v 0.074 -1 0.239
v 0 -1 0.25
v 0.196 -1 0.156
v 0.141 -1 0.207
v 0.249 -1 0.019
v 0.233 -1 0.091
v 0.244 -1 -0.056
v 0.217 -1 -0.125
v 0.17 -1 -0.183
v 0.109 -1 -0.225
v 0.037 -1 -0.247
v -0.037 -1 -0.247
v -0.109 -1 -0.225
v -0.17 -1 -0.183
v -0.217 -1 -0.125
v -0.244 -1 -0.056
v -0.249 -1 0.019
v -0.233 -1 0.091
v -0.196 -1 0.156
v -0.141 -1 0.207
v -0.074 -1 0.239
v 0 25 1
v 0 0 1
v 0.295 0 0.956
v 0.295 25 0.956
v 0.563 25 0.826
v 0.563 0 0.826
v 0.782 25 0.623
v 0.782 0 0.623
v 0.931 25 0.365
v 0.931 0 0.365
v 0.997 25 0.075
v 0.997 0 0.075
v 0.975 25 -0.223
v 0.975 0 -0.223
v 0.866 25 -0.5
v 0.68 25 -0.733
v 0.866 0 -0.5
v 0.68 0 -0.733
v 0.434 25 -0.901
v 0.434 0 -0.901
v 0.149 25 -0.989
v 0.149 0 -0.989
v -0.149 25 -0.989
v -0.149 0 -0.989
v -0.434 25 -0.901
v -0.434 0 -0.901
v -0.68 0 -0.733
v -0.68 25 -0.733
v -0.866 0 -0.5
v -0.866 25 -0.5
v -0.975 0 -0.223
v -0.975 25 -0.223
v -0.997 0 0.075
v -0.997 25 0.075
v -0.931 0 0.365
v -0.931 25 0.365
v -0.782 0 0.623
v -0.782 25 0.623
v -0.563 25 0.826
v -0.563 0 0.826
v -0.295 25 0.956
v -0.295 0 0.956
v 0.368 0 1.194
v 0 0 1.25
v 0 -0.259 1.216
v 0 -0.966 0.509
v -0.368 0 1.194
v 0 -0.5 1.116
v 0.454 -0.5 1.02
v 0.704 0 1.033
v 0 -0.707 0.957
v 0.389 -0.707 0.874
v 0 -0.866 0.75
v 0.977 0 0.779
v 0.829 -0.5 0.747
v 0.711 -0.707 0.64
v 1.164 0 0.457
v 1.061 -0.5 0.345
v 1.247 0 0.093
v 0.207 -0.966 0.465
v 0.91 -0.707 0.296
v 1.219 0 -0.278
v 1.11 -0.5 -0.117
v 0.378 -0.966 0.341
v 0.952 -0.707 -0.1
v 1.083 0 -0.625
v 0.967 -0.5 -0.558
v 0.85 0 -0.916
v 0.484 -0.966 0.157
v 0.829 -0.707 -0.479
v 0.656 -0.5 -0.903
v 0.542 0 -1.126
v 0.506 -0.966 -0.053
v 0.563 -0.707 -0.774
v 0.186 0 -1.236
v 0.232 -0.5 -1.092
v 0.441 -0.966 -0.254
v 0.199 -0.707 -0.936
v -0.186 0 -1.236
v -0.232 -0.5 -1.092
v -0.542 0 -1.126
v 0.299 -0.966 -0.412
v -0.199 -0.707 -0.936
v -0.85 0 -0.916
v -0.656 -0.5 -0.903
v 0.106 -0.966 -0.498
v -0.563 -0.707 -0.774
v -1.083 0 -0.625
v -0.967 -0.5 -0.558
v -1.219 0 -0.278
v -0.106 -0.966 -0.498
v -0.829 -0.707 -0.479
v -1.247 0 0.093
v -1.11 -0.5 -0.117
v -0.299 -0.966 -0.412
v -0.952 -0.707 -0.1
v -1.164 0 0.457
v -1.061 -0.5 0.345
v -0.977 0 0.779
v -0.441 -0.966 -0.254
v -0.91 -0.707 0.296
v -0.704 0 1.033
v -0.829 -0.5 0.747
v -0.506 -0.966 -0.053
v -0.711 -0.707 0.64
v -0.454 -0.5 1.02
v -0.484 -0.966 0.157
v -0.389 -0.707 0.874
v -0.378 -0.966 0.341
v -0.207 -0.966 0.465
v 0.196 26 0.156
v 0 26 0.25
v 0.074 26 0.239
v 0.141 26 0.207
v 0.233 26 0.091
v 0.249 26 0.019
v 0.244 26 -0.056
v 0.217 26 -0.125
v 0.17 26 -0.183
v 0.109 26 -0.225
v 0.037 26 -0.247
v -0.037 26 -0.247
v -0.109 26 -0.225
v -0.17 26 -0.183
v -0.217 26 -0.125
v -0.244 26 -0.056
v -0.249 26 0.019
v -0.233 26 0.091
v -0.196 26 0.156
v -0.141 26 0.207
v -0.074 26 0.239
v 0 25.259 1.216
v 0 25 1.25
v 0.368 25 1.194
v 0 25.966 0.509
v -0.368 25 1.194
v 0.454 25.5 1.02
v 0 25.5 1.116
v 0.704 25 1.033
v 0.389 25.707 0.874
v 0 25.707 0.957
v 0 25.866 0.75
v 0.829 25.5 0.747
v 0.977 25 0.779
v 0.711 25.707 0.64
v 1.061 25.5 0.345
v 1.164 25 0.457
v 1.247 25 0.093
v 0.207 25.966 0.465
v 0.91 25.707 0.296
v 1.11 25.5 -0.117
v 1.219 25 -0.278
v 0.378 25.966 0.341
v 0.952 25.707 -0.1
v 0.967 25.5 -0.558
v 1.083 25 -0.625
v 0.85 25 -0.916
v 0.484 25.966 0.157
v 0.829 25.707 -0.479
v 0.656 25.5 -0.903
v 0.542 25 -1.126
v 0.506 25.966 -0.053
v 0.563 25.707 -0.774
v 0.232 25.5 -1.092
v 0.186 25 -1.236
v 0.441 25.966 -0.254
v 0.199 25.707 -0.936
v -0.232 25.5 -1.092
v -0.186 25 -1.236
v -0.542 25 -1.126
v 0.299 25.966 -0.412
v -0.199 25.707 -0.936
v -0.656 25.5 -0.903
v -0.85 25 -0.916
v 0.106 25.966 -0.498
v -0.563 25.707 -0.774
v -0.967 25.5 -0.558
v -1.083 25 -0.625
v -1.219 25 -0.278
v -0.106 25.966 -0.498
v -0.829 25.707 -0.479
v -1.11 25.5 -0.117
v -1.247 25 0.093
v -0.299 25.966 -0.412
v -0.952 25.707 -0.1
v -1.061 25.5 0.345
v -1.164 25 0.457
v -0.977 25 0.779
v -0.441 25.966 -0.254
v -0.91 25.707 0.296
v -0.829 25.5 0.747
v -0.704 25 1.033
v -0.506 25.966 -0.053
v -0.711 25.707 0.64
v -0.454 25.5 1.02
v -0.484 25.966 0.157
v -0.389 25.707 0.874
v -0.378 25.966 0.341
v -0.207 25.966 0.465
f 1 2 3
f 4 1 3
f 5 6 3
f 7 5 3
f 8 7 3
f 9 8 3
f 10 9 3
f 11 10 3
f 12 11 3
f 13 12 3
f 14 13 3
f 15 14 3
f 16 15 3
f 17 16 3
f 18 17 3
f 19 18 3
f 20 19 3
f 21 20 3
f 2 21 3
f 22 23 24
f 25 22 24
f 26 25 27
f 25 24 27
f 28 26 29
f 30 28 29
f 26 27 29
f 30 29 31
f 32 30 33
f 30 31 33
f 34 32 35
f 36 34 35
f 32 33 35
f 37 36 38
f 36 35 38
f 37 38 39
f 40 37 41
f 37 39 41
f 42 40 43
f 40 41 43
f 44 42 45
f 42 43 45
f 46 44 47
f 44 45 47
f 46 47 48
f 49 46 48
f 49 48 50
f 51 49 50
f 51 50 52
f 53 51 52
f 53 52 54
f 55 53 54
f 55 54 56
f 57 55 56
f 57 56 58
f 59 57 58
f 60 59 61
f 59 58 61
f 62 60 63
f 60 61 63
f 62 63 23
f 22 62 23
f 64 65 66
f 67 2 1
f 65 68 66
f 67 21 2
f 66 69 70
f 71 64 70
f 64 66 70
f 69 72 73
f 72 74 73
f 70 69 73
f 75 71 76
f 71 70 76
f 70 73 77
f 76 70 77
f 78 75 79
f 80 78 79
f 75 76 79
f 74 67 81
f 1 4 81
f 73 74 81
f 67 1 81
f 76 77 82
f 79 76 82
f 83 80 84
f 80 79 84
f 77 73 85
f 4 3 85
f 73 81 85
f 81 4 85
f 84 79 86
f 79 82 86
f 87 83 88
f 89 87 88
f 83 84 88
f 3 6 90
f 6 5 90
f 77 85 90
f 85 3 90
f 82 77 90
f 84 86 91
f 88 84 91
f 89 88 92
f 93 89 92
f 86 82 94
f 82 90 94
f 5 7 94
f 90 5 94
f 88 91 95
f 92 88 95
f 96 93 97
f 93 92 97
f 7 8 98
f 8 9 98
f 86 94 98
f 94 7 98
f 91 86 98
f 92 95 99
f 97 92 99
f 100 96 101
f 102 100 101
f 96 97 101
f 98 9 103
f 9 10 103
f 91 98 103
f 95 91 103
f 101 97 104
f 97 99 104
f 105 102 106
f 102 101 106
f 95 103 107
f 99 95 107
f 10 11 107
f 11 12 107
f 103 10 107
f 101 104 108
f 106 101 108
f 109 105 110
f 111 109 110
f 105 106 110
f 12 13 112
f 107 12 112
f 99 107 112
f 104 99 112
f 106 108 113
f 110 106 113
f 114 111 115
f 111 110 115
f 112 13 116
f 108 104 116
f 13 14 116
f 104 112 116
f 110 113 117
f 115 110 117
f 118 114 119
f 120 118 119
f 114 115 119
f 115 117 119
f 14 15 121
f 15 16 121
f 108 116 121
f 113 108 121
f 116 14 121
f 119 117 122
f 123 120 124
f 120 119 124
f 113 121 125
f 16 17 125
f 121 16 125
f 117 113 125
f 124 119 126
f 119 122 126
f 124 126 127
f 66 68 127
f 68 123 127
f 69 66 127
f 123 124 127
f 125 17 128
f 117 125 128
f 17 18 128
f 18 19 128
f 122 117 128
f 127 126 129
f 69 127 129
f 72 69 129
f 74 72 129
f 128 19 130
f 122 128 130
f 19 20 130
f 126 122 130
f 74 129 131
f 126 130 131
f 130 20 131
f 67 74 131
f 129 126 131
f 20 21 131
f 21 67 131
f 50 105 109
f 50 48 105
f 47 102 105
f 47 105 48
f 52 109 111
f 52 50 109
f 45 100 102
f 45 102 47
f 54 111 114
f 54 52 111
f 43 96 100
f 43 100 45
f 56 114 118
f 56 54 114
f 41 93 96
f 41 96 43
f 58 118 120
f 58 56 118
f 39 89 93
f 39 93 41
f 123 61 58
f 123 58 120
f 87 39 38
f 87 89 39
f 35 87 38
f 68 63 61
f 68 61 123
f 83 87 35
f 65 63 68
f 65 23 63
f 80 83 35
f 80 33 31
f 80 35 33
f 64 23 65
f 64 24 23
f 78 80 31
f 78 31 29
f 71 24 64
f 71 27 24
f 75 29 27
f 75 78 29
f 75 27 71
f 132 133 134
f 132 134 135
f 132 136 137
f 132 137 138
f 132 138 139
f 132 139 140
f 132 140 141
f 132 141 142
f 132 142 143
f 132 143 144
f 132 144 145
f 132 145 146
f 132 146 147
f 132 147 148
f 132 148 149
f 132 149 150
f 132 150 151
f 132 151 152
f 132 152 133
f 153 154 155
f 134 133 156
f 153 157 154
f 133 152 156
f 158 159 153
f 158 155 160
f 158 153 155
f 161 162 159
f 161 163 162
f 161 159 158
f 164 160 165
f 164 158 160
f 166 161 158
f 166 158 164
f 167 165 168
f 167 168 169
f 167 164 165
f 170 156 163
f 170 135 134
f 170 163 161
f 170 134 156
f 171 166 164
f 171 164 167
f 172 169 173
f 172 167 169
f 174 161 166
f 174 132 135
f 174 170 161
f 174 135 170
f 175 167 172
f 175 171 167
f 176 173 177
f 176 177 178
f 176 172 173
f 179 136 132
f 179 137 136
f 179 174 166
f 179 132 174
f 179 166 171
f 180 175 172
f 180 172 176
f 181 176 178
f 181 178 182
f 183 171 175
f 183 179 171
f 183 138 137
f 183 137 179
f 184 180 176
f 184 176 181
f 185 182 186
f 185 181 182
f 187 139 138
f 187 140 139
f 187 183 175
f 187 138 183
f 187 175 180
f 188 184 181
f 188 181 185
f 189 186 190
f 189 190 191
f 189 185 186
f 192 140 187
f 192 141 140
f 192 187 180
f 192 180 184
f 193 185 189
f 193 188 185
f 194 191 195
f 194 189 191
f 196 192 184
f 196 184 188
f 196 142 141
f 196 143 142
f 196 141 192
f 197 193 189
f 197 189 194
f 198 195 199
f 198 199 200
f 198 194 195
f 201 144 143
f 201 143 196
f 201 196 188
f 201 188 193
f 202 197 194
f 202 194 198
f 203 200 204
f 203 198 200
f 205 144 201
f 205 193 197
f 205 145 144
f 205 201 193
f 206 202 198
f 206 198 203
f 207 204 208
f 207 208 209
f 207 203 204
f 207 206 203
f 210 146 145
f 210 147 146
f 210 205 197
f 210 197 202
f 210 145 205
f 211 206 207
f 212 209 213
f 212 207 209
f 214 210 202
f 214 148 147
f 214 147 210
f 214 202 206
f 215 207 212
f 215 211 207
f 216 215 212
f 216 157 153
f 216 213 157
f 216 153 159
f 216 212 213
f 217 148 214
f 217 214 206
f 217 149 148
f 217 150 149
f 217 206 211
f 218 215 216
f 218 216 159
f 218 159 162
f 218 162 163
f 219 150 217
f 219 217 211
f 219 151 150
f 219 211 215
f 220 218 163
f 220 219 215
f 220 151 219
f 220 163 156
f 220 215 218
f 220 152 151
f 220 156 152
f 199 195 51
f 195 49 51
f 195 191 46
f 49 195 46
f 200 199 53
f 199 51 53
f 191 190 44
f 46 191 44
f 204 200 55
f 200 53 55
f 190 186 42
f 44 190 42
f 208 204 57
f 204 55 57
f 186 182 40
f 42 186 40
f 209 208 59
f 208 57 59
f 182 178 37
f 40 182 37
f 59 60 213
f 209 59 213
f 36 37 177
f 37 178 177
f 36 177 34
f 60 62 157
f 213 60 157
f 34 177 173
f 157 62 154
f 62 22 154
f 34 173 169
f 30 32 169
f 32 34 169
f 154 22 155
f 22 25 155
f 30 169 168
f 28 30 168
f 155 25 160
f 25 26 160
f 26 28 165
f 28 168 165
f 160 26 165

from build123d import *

# Parameters (mm, degrees)
SKETCH1_R           = 1
BOSS_EXTRUDE1_DEPTH = 25
SKETCH2_R           = 1.25
BOSS_EXTRUDE2_DEPTH = 1
FILLET1_R           = 1
BOSS_EXTRUDE5_START = 26
SKETCH3_R           = 1.25
BOSS_EXTRUDE5_DEPTH = 1
FILLET2_R           = 1


with BuildPart() as part:
    # Sketch1 → Boss-Extrude1 (new body)
    with BuildSketch(Plane(origin=(0, 0, 0), x_dir=(1, 0, 0), z_dir=(0, 1, 0))):
        with Locations(Location((0, 0, 0), (0, 0, 270))):
            Circle(SKETCH1_R)
    extrude(amount=BOSS_EXTRUDE1_DEPTH)

    # Sketch2 → Boss-Extrude2 (add)
    with BuildSketch(Plane(origin=(0, 0, 0), x_dir=(1, 0, 0), z_dir=(0, 1, 0))):
        with Locations(Location((0, 0, 0), (0, 0, 270))):
            Circle(SKETCH2_R)
    extrude(amount=-BOSS_EXTRUDE2_DEPTH)

    # Fillet1
    fillet1_edges = [part.edges().sort_by_distance(p)[0] for p in [
        (0, -1, -1.25),
    ]]
    fillet(fillet1_edges, radius=FILLET1_R - 0.0001)  # a hair under: the kernel refuses the full size

    # Sketch3 → Boss-Extrude5 (add)
    with BuildSketch(Plane(origin=(0, 0, 0), x_dir=(1, 0, 0), z_dir=(0, 1, 0)).offset(BOSS_EXTRUDE5_START)):
        with Locations(Location((0, 0, 0), (0, 0, 270))):
            Circle(SKETCH3_R)
    extrude(amount=-BOSS_EXTRUDE5_DEPTH)

    # Fillet2
    fillet2_edges = [part.edges().sort_by_distance(p)[0] for p in [
        (0, 26, -1.25),
    ]]
    fillet(fillet2_edges, radius=FILLET2_R - 0.0001)  # a hair under: the kernel refuses the full size


solid = part.part
